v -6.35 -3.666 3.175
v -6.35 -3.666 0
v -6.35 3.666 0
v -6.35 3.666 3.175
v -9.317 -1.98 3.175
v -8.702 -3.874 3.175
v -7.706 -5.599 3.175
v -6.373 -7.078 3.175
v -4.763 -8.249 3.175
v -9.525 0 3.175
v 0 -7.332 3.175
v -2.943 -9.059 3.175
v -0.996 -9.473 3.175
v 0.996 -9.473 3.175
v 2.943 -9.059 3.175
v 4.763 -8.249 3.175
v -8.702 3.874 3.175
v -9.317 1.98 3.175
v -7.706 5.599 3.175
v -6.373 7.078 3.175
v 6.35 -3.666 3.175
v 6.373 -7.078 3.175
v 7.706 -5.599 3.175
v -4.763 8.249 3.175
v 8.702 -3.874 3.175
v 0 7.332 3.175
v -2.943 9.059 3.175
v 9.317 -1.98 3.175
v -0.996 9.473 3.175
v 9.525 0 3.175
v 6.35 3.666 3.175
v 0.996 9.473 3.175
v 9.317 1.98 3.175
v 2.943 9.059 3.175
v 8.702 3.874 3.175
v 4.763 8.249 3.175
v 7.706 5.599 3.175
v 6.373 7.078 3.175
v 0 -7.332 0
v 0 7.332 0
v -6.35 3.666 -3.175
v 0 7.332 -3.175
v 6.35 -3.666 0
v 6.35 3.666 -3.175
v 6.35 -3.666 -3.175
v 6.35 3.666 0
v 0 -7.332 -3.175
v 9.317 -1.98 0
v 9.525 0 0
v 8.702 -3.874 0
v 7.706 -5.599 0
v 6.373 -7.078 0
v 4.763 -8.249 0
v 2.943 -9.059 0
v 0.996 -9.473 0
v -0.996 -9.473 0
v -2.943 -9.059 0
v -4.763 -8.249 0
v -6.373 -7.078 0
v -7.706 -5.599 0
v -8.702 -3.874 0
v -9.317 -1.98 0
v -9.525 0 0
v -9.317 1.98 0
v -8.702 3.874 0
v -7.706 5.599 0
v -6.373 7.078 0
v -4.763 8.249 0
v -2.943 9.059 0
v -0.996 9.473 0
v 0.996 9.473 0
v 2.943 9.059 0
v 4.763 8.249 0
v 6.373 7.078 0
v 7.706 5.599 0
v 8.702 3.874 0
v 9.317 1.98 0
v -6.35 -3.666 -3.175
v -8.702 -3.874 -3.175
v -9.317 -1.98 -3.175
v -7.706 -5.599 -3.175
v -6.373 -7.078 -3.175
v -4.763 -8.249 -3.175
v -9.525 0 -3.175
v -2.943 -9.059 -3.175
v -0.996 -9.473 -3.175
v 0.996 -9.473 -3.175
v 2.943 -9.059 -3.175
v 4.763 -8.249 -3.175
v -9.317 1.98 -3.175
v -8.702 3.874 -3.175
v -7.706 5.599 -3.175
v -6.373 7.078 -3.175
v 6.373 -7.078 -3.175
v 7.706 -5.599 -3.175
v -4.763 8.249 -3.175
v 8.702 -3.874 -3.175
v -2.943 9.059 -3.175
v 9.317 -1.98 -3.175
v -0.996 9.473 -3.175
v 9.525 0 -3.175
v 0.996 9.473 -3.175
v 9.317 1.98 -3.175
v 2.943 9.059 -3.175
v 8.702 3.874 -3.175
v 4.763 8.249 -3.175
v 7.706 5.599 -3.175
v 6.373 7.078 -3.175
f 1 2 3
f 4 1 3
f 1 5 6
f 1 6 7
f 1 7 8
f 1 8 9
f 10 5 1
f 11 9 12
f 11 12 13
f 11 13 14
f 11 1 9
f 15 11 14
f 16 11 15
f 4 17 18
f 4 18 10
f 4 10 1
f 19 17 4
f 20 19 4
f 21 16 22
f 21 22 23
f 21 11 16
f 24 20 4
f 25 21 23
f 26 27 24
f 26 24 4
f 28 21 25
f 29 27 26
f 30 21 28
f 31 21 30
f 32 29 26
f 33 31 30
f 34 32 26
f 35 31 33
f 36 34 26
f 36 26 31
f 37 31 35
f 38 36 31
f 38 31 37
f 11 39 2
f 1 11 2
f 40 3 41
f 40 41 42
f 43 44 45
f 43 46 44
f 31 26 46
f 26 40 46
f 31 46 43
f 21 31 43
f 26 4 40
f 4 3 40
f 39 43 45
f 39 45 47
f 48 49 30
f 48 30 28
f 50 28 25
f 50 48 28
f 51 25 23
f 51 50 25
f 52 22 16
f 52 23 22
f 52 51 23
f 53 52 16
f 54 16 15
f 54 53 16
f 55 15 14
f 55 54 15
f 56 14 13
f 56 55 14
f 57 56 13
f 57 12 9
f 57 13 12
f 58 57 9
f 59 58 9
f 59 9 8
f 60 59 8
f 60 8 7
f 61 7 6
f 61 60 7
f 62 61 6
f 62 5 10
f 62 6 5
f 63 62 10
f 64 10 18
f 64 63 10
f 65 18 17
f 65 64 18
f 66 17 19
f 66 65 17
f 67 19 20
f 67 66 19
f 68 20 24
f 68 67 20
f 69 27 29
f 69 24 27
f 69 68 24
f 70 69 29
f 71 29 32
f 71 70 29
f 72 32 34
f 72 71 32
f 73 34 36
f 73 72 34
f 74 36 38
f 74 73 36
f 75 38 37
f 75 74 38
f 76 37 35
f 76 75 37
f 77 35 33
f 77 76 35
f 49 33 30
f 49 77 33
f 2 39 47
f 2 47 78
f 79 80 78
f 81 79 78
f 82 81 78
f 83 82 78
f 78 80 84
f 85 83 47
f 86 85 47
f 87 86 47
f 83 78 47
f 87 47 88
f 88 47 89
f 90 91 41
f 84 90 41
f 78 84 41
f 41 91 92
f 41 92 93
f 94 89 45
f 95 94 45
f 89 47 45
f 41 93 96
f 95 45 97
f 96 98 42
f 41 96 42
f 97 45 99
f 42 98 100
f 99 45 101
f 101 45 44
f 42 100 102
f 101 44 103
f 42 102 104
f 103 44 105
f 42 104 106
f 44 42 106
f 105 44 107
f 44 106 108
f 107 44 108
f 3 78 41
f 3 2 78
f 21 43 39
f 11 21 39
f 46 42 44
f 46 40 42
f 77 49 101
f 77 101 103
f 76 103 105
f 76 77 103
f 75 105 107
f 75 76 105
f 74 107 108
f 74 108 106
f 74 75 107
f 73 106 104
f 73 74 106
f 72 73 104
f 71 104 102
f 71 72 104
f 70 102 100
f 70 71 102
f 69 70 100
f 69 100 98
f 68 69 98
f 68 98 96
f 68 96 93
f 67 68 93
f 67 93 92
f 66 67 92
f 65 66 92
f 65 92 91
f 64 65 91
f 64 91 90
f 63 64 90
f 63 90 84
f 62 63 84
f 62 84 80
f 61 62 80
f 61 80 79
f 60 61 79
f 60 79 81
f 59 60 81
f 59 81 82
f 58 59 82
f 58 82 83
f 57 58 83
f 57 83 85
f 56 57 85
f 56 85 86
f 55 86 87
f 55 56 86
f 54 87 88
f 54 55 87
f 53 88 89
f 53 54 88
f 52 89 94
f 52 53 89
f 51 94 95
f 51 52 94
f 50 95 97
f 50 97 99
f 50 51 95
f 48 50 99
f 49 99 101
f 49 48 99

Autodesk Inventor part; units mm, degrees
ref_plane "YZ Plane" through (0, 0, 0) normal (1, 0, 0) x (0, 1, 0)
ref_plane "XZ Plane" through (0, 0, 0) normal (0, 1, 0) x (-1, 0, 0)
ref_plane "XY Plane" through (0, 0, 0) normal (0, 0, 1) x (1, 0, 0)
sketch "Sketch1" plane through (0, 0, 0) normal (0, 0, 1) x (1, 0, 0)
  circle A0 centre (0, 0) radius 9.525
  line L0 (0, -7.3323) -> (-6.35, -3.6662)
  line L1 (-6.35, -3.6662) -> (-6.35, 3.6662)
  line L2 (-6.35, 3.6662) -> (0, 7.3323)
  line L3 (0, 7.3323) -> (6.35, 3.6662)
  line L4 (6.35, 3.6662) -> (6.35, -3.6662)
  line L5 (6.35, -3.6662) -> (0, -7.3323)
  dimension "d0" = 19.05
  dimension "d1" = 12.7
extrude "Extrusion1" add sketch "Sketch1" along normal mid plane 6.35
properties part number "500 Hex Spacer 0.25" material "Acetal Resin, Black"
